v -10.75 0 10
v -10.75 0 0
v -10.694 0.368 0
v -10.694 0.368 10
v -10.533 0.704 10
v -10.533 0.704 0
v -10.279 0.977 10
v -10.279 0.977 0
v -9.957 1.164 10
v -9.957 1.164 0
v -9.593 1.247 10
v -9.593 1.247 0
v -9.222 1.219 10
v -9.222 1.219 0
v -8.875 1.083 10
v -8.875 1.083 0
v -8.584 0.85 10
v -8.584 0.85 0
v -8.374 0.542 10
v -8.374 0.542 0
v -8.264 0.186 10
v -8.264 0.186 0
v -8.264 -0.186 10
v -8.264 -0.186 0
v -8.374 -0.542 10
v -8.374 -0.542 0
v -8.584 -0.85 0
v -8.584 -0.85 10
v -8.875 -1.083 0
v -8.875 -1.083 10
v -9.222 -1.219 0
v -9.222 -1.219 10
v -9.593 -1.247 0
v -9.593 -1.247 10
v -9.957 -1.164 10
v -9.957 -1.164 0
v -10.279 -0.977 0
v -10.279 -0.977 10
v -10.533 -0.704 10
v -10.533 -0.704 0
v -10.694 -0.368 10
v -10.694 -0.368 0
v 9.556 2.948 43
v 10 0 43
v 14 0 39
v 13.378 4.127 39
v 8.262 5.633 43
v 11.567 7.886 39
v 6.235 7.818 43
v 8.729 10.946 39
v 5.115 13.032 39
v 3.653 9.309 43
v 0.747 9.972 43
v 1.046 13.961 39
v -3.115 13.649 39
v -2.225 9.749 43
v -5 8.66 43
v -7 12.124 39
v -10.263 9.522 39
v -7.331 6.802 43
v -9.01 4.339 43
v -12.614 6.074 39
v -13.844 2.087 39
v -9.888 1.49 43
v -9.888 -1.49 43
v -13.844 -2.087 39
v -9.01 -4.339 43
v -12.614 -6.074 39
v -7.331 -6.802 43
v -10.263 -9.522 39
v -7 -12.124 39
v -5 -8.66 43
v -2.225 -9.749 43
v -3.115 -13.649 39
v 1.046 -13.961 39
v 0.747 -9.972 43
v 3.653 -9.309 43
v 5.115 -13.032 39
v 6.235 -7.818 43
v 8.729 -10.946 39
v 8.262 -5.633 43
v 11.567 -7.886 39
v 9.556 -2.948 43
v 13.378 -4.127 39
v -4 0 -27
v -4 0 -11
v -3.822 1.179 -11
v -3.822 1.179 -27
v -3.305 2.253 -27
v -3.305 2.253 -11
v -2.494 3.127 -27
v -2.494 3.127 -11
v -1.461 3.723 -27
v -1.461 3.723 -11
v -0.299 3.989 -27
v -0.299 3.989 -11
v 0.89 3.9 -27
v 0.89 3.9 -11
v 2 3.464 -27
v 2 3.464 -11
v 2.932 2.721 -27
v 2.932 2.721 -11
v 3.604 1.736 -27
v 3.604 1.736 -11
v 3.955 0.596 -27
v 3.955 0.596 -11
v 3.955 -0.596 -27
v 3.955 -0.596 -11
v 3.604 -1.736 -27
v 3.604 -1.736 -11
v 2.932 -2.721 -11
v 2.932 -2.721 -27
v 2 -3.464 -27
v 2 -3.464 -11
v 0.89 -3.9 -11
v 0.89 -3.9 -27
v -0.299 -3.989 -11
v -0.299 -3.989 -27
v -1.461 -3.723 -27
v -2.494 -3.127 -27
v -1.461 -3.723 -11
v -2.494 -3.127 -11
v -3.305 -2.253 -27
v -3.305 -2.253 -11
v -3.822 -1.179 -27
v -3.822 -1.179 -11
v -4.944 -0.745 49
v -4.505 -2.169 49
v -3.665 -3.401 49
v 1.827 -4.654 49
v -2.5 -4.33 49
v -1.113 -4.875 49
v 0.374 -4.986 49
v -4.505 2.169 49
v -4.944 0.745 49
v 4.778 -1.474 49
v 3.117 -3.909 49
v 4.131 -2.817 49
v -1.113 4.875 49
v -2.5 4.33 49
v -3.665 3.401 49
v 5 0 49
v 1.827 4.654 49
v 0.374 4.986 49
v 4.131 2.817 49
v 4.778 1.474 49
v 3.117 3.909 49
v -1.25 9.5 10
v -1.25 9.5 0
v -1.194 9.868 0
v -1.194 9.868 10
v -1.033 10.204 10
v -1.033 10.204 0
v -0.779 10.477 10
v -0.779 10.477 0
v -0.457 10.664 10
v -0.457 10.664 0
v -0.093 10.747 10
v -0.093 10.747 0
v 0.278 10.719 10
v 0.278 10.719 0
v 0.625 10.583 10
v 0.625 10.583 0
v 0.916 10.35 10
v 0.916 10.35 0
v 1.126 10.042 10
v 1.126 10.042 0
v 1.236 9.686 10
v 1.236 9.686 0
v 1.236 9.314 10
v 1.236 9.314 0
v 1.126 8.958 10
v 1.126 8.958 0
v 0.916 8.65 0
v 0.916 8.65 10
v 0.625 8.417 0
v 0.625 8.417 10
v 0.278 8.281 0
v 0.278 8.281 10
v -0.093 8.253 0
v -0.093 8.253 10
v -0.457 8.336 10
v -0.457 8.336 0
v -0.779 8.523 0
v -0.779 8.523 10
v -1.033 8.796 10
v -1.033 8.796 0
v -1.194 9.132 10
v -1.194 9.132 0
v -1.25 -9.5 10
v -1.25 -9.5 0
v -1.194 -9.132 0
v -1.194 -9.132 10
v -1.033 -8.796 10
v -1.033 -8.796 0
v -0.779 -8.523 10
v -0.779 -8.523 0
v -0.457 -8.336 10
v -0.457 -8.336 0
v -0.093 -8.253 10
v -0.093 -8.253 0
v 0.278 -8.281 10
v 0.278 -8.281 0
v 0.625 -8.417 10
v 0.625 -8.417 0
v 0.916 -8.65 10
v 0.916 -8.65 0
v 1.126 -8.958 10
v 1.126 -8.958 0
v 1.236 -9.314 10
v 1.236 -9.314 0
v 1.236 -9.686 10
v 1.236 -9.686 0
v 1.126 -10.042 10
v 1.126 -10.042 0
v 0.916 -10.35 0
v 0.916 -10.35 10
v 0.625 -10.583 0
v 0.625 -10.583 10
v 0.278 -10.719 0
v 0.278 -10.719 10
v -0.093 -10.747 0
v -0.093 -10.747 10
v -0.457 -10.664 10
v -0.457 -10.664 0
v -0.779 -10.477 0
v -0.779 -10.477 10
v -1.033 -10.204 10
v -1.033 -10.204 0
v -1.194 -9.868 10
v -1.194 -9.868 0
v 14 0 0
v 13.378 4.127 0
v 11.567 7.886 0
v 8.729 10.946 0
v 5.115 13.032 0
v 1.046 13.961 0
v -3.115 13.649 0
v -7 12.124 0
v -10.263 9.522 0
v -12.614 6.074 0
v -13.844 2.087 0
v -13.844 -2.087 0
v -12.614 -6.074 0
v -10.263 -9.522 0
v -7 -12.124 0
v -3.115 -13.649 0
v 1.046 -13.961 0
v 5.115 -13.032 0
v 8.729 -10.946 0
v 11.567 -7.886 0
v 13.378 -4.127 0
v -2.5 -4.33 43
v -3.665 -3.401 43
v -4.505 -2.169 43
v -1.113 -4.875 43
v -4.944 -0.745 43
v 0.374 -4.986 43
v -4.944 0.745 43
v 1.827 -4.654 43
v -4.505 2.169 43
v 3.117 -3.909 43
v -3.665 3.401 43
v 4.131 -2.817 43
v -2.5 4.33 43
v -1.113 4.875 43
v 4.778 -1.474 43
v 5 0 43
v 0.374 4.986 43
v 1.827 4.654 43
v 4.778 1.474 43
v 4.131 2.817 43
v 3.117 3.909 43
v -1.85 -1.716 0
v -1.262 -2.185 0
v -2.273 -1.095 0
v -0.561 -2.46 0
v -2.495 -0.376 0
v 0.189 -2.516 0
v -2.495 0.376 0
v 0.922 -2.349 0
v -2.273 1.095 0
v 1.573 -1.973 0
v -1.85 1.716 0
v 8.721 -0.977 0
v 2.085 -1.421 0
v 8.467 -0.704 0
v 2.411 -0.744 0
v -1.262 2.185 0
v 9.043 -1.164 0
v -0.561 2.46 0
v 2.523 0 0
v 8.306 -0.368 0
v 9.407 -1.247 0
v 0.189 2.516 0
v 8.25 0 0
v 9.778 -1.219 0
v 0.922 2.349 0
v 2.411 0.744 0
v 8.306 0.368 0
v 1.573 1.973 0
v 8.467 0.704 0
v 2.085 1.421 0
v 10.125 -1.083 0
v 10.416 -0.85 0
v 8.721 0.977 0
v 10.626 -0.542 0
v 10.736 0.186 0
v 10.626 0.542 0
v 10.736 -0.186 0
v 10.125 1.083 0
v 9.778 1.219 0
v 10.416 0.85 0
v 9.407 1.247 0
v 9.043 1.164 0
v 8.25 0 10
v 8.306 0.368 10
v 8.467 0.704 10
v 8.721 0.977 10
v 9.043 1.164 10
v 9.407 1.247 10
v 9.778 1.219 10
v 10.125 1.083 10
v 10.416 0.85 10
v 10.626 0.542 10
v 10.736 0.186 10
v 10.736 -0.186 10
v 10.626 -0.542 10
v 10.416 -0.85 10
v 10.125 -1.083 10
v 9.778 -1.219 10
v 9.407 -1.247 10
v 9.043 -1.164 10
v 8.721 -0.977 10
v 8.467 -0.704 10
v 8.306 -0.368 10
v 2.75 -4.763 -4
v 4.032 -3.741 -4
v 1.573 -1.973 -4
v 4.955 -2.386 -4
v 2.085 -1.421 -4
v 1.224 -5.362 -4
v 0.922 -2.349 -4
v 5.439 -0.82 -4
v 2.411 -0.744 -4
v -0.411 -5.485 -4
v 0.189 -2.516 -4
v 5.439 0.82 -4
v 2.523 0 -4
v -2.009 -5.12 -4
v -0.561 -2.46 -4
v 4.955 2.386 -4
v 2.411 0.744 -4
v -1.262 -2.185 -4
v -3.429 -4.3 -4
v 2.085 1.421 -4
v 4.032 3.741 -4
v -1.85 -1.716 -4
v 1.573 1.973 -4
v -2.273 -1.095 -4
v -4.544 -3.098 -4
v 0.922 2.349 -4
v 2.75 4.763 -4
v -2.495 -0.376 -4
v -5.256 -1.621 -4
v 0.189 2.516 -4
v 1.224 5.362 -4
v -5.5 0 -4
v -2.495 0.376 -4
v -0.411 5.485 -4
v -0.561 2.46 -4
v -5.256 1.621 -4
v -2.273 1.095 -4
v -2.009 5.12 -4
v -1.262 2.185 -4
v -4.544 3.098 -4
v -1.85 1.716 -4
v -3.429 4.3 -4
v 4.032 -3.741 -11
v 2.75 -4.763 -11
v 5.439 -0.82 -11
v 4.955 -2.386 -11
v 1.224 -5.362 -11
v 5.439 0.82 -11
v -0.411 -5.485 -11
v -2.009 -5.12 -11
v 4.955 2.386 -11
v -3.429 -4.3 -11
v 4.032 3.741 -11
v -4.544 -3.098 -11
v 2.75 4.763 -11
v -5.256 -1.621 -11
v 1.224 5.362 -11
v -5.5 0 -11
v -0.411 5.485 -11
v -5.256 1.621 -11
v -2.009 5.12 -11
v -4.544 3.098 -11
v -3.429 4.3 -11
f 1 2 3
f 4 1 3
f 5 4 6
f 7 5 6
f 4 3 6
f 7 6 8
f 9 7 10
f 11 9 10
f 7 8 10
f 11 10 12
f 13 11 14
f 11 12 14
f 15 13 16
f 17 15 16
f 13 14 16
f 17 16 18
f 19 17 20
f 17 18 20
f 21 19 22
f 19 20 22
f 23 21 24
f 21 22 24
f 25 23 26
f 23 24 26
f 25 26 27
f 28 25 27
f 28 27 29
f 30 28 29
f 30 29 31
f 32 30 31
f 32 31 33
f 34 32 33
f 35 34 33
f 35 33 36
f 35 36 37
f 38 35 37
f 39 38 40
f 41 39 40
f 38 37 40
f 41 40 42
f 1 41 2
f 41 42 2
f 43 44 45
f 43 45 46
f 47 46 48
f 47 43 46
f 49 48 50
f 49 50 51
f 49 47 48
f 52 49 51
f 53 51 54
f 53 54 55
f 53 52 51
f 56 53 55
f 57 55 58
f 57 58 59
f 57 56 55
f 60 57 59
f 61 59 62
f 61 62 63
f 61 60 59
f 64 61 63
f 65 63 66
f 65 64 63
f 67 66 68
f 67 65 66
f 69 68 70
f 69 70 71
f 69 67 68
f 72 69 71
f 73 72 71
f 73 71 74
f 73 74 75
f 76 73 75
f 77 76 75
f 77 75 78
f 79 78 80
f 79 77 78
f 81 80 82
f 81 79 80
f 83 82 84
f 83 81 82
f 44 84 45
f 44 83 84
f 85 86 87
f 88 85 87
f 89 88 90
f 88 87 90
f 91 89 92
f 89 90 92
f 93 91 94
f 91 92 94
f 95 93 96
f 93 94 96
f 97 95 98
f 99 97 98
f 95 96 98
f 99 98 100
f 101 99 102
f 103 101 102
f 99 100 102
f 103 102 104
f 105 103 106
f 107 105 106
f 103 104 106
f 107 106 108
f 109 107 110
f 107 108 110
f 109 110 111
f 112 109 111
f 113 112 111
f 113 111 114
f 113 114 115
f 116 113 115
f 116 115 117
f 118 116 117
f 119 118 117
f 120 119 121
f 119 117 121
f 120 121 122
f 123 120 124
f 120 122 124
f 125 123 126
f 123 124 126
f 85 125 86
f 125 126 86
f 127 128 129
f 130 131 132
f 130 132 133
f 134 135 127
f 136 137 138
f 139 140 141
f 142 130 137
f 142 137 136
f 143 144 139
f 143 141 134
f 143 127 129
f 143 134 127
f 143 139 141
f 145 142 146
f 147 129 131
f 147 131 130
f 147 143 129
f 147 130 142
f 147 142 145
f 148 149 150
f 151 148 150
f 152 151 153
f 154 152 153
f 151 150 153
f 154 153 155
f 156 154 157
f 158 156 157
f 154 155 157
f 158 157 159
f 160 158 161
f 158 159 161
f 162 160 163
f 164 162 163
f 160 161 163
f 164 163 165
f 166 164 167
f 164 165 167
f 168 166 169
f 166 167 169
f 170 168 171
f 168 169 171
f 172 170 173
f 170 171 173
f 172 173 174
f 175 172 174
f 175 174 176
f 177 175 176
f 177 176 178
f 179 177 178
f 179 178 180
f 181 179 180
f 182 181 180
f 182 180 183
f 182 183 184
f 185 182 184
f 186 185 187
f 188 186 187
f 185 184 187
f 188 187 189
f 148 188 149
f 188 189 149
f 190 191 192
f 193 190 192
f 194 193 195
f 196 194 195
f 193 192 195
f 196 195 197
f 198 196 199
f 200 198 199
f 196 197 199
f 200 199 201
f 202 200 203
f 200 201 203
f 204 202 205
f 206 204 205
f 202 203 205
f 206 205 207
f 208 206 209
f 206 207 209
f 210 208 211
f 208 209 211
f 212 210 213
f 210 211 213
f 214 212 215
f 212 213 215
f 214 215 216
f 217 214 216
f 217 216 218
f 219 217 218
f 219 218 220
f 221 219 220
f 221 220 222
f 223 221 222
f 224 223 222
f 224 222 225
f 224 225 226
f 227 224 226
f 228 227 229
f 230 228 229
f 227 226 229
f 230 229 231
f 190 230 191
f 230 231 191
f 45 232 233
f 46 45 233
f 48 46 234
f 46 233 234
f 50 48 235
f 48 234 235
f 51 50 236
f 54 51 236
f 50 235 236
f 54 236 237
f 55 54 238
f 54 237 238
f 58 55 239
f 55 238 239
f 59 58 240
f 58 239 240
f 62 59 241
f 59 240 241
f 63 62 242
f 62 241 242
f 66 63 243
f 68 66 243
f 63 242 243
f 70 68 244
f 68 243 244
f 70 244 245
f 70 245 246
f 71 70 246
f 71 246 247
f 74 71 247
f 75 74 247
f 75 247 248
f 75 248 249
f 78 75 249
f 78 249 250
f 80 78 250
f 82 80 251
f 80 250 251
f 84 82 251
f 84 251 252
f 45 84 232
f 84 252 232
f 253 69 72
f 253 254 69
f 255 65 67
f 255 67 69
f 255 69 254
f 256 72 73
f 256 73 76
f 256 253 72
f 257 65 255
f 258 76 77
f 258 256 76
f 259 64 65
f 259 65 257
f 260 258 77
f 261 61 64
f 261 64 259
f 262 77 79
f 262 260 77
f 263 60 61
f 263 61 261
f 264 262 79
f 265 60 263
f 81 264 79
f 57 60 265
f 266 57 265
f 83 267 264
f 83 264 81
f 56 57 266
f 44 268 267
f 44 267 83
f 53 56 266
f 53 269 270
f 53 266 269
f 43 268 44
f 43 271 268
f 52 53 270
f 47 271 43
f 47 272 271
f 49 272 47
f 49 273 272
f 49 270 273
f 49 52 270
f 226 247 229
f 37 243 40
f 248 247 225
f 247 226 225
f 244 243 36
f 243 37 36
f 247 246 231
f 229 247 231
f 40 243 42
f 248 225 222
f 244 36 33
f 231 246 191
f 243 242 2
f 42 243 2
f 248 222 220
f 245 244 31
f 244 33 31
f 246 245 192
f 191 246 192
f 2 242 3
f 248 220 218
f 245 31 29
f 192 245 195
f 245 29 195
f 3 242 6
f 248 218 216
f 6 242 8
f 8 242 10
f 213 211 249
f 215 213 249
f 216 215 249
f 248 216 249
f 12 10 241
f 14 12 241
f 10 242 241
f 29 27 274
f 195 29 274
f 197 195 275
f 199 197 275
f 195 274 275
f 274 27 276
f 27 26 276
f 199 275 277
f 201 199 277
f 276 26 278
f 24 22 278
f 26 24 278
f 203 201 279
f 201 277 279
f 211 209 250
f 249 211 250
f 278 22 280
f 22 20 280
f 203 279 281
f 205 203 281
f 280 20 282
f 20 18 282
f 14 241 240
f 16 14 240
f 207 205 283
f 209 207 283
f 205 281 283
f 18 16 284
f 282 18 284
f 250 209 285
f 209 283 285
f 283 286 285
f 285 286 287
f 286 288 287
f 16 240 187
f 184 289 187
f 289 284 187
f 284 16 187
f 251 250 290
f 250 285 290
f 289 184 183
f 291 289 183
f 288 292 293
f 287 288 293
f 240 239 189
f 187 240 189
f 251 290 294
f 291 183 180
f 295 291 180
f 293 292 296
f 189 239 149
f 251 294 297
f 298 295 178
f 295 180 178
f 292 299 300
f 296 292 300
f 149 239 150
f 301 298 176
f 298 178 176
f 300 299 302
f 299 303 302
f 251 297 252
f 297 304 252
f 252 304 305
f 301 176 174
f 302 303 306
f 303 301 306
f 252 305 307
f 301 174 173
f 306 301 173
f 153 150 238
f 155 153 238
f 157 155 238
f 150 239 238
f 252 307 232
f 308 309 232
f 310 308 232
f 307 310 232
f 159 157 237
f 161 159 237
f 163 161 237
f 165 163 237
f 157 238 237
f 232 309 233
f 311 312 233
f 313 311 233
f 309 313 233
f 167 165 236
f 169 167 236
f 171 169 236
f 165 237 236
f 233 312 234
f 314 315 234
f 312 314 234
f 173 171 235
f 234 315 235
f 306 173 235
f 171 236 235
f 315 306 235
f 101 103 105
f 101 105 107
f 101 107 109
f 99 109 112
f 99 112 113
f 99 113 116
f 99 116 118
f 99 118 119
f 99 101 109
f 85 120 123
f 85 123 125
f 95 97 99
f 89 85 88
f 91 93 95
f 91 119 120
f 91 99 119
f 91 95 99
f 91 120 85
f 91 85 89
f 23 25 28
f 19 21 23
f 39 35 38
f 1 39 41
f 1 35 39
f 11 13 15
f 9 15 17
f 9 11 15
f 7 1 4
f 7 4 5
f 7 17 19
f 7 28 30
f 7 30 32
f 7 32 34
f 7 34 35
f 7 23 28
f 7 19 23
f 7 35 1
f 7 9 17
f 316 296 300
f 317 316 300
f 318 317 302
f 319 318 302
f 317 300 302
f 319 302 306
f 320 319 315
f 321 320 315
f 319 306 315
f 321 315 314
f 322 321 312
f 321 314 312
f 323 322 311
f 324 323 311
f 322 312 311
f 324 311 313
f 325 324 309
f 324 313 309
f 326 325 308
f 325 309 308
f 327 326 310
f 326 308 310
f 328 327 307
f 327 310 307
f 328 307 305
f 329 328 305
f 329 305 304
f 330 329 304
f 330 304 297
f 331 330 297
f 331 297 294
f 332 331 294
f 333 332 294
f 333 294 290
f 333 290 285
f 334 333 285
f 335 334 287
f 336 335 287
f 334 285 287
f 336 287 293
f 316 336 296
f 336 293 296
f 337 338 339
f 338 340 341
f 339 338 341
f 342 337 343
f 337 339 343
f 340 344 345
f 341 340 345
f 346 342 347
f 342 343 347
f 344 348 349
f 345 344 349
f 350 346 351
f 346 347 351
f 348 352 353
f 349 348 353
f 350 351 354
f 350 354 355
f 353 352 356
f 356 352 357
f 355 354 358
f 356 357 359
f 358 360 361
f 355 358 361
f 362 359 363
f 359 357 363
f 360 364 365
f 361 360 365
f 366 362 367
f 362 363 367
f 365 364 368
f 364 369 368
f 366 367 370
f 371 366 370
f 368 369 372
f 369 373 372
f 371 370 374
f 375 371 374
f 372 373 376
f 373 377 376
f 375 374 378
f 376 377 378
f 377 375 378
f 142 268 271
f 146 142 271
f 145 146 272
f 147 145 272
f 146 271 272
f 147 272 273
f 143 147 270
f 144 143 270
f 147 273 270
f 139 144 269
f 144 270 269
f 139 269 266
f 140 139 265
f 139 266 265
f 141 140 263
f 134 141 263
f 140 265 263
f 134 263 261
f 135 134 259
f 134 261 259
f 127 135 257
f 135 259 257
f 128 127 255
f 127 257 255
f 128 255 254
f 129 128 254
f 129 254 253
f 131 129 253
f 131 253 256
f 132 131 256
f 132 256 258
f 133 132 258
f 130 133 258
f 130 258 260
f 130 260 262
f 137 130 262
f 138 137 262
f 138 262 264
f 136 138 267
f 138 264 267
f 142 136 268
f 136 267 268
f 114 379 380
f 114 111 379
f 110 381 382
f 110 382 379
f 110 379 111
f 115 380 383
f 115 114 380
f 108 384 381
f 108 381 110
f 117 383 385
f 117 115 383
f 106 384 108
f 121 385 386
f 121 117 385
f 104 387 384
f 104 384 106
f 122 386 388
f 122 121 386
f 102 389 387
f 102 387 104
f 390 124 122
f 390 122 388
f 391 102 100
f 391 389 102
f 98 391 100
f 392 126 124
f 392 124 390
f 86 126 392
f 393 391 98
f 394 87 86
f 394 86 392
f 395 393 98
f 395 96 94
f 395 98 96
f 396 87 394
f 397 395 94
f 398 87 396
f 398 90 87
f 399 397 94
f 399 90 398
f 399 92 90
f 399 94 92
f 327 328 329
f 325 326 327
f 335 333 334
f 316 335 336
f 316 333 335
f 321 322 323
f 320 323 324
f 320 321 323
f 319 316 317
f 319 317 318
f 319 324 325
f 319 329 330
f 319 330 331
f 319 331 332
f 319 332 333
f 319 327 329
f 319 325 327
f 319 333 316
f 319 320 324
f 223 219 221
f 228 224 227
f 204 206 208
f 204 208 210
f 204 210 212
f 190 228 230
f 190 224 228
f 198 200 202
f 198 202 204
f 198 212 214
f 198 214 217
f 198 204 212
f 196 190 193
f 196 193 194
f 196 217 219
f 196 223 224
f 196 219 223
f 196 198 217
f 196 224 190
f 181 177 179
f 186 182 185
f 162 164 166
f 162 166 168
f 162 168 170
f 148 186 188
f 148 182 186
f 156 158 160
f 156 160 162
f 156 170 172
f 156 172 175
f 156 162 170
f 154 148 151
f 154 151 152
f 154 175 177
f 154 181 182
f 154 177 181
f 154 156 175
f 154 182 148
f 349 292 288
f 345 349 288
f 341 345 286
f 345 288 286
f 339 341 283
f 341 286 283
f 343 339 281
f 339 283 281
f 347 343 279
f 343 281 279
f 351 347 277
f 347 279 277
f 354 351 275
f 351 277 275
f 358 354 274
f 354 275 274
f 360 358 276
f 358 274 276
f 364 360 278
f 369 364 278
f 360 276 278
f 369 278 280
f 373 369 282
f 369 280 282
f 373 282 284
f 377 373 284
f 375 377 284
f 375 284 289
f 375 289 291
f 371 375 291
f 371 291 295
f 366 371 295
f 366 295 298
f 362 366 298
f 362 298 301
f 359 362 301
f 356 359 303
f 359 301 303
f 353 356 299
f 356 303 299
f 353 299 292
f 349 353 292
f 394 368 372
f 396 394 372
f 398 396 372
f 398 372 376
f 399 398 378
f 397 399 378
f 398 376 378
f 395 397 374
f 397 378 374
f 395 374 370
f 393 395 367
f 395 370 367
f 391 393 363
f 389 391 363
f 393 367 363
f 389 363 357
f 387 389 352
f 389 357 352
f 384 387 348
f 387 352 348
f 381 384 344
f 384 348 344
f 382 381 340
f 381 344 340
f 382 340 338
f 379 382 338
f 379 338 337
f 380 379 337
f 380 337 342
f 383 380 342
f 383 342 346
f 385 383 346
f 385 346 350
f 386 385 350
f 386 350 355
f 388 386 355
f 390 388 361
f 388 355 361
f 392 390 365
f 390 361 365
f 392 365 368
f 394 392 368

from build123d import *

# Parameters (mm, degrees)
ESQUISSE1_R             = 14
BOSS_EXTRU_1_DEPTH      = 43
CHANFREIN1_SIZE         = 4
ESQUISSE2_R             = 5
BOSS_EXTRU_2_DEPTH      = 6
ESQUISSE3_R             = 1.25
ENL_V_MAT_EXTRU_1_DEPTH = 10
ESQUISSE4_R             = 2.523074606
BOSS_EXTRU_3_DEPTH      = 4
ESQUISSE5_R             = 5.5
BOSS_EXTRU_4_DEPTH      = 7
ESQUISSE6_R             = 4
BOSS_EXTRU_5_DEPTH      = 16


with BuildPart() as part:
    # Esquisse1 → Boss.-Extru.1 (new body)
    with BuildSketch(Plane.XY):
        Circle(ESQUISSE1_R)
    extrude(amount=BOSS_EXTRU_1_DEPTH)

    # Chanfrein1
    chanfrein1_edges = [part.edges().sort_by_distance(p)[0] for p in [
        (-14, 0, 43),
    ]]
    chamfer(chanfrein1_edges, length=CHANFREIN1_SIZE)

    # Esquisse2 → Boss.-Extru.2 (add)
    with BuildSketch(Plane.XY.offset(43)):
        Circle(ESQUISSE2_R)
    extrude(amount=BOSS_EXTRU_2_DEPTH)

    # Esquisse3 → Enlèv. mat.-Extru.1 (cut)
    with BuildSketch(Plane(origin=(0, 0, 0), x_dir=(-1, 0, 0), z_dir=(0, 0, -1))):
        with Locations((0, 9.5)):
            Circle(ESQUISSE3_R)
        with Locations((9.5, 0)):
            Circle(ESQUISSE3_R)
        with Locations((0, -9.5)):
            Circle(ESQUISSE3_R)
        with Locations((-9.5, 0)):
            Circle(ESQUISSE3_R)
    extrude(amount=-ENL_V_MAT_EXTRU_1_DEPTH, mode=Mode.SUBTRACT)

    # Esquisse4 → Boss.-Extru.3 (add)
    with BuildSketch(Plane(origin=(0, 0, 0), x_dir=(-1, 0, 0), z_dir=(0, 0, -1))):
        with Locations(Location((0, 0, 0), (0, 0, 180))):
            Circle(ESQUISSE4_R)
    extrude(amount=BOSS_EXTRU_3_DEPTH)

    # Esquisse5 → Boss.-Extru.4 (add)
    with BuildSketch(Plane(origin=(0, 0, -4), x_dir=(-1, 0, 0), z_dir=(0, 0, -1))):
        Circle(ESQUISSE5_R)
    extrude(amount=BOSS_EXTRU_4_DEPTH)

    # Esquisse6 → Boss.-Extru.5 (add)
    with BuildSketch(Plane(origin=(0, 0, -11), x_dir=(-1, 0, 0), z_dir=(0, 0, -1))):
        Circle(ESQUISSE6_R)
    extrude(amount=BOSS_EXTRU_5_DEPTH)


solid = part.part
